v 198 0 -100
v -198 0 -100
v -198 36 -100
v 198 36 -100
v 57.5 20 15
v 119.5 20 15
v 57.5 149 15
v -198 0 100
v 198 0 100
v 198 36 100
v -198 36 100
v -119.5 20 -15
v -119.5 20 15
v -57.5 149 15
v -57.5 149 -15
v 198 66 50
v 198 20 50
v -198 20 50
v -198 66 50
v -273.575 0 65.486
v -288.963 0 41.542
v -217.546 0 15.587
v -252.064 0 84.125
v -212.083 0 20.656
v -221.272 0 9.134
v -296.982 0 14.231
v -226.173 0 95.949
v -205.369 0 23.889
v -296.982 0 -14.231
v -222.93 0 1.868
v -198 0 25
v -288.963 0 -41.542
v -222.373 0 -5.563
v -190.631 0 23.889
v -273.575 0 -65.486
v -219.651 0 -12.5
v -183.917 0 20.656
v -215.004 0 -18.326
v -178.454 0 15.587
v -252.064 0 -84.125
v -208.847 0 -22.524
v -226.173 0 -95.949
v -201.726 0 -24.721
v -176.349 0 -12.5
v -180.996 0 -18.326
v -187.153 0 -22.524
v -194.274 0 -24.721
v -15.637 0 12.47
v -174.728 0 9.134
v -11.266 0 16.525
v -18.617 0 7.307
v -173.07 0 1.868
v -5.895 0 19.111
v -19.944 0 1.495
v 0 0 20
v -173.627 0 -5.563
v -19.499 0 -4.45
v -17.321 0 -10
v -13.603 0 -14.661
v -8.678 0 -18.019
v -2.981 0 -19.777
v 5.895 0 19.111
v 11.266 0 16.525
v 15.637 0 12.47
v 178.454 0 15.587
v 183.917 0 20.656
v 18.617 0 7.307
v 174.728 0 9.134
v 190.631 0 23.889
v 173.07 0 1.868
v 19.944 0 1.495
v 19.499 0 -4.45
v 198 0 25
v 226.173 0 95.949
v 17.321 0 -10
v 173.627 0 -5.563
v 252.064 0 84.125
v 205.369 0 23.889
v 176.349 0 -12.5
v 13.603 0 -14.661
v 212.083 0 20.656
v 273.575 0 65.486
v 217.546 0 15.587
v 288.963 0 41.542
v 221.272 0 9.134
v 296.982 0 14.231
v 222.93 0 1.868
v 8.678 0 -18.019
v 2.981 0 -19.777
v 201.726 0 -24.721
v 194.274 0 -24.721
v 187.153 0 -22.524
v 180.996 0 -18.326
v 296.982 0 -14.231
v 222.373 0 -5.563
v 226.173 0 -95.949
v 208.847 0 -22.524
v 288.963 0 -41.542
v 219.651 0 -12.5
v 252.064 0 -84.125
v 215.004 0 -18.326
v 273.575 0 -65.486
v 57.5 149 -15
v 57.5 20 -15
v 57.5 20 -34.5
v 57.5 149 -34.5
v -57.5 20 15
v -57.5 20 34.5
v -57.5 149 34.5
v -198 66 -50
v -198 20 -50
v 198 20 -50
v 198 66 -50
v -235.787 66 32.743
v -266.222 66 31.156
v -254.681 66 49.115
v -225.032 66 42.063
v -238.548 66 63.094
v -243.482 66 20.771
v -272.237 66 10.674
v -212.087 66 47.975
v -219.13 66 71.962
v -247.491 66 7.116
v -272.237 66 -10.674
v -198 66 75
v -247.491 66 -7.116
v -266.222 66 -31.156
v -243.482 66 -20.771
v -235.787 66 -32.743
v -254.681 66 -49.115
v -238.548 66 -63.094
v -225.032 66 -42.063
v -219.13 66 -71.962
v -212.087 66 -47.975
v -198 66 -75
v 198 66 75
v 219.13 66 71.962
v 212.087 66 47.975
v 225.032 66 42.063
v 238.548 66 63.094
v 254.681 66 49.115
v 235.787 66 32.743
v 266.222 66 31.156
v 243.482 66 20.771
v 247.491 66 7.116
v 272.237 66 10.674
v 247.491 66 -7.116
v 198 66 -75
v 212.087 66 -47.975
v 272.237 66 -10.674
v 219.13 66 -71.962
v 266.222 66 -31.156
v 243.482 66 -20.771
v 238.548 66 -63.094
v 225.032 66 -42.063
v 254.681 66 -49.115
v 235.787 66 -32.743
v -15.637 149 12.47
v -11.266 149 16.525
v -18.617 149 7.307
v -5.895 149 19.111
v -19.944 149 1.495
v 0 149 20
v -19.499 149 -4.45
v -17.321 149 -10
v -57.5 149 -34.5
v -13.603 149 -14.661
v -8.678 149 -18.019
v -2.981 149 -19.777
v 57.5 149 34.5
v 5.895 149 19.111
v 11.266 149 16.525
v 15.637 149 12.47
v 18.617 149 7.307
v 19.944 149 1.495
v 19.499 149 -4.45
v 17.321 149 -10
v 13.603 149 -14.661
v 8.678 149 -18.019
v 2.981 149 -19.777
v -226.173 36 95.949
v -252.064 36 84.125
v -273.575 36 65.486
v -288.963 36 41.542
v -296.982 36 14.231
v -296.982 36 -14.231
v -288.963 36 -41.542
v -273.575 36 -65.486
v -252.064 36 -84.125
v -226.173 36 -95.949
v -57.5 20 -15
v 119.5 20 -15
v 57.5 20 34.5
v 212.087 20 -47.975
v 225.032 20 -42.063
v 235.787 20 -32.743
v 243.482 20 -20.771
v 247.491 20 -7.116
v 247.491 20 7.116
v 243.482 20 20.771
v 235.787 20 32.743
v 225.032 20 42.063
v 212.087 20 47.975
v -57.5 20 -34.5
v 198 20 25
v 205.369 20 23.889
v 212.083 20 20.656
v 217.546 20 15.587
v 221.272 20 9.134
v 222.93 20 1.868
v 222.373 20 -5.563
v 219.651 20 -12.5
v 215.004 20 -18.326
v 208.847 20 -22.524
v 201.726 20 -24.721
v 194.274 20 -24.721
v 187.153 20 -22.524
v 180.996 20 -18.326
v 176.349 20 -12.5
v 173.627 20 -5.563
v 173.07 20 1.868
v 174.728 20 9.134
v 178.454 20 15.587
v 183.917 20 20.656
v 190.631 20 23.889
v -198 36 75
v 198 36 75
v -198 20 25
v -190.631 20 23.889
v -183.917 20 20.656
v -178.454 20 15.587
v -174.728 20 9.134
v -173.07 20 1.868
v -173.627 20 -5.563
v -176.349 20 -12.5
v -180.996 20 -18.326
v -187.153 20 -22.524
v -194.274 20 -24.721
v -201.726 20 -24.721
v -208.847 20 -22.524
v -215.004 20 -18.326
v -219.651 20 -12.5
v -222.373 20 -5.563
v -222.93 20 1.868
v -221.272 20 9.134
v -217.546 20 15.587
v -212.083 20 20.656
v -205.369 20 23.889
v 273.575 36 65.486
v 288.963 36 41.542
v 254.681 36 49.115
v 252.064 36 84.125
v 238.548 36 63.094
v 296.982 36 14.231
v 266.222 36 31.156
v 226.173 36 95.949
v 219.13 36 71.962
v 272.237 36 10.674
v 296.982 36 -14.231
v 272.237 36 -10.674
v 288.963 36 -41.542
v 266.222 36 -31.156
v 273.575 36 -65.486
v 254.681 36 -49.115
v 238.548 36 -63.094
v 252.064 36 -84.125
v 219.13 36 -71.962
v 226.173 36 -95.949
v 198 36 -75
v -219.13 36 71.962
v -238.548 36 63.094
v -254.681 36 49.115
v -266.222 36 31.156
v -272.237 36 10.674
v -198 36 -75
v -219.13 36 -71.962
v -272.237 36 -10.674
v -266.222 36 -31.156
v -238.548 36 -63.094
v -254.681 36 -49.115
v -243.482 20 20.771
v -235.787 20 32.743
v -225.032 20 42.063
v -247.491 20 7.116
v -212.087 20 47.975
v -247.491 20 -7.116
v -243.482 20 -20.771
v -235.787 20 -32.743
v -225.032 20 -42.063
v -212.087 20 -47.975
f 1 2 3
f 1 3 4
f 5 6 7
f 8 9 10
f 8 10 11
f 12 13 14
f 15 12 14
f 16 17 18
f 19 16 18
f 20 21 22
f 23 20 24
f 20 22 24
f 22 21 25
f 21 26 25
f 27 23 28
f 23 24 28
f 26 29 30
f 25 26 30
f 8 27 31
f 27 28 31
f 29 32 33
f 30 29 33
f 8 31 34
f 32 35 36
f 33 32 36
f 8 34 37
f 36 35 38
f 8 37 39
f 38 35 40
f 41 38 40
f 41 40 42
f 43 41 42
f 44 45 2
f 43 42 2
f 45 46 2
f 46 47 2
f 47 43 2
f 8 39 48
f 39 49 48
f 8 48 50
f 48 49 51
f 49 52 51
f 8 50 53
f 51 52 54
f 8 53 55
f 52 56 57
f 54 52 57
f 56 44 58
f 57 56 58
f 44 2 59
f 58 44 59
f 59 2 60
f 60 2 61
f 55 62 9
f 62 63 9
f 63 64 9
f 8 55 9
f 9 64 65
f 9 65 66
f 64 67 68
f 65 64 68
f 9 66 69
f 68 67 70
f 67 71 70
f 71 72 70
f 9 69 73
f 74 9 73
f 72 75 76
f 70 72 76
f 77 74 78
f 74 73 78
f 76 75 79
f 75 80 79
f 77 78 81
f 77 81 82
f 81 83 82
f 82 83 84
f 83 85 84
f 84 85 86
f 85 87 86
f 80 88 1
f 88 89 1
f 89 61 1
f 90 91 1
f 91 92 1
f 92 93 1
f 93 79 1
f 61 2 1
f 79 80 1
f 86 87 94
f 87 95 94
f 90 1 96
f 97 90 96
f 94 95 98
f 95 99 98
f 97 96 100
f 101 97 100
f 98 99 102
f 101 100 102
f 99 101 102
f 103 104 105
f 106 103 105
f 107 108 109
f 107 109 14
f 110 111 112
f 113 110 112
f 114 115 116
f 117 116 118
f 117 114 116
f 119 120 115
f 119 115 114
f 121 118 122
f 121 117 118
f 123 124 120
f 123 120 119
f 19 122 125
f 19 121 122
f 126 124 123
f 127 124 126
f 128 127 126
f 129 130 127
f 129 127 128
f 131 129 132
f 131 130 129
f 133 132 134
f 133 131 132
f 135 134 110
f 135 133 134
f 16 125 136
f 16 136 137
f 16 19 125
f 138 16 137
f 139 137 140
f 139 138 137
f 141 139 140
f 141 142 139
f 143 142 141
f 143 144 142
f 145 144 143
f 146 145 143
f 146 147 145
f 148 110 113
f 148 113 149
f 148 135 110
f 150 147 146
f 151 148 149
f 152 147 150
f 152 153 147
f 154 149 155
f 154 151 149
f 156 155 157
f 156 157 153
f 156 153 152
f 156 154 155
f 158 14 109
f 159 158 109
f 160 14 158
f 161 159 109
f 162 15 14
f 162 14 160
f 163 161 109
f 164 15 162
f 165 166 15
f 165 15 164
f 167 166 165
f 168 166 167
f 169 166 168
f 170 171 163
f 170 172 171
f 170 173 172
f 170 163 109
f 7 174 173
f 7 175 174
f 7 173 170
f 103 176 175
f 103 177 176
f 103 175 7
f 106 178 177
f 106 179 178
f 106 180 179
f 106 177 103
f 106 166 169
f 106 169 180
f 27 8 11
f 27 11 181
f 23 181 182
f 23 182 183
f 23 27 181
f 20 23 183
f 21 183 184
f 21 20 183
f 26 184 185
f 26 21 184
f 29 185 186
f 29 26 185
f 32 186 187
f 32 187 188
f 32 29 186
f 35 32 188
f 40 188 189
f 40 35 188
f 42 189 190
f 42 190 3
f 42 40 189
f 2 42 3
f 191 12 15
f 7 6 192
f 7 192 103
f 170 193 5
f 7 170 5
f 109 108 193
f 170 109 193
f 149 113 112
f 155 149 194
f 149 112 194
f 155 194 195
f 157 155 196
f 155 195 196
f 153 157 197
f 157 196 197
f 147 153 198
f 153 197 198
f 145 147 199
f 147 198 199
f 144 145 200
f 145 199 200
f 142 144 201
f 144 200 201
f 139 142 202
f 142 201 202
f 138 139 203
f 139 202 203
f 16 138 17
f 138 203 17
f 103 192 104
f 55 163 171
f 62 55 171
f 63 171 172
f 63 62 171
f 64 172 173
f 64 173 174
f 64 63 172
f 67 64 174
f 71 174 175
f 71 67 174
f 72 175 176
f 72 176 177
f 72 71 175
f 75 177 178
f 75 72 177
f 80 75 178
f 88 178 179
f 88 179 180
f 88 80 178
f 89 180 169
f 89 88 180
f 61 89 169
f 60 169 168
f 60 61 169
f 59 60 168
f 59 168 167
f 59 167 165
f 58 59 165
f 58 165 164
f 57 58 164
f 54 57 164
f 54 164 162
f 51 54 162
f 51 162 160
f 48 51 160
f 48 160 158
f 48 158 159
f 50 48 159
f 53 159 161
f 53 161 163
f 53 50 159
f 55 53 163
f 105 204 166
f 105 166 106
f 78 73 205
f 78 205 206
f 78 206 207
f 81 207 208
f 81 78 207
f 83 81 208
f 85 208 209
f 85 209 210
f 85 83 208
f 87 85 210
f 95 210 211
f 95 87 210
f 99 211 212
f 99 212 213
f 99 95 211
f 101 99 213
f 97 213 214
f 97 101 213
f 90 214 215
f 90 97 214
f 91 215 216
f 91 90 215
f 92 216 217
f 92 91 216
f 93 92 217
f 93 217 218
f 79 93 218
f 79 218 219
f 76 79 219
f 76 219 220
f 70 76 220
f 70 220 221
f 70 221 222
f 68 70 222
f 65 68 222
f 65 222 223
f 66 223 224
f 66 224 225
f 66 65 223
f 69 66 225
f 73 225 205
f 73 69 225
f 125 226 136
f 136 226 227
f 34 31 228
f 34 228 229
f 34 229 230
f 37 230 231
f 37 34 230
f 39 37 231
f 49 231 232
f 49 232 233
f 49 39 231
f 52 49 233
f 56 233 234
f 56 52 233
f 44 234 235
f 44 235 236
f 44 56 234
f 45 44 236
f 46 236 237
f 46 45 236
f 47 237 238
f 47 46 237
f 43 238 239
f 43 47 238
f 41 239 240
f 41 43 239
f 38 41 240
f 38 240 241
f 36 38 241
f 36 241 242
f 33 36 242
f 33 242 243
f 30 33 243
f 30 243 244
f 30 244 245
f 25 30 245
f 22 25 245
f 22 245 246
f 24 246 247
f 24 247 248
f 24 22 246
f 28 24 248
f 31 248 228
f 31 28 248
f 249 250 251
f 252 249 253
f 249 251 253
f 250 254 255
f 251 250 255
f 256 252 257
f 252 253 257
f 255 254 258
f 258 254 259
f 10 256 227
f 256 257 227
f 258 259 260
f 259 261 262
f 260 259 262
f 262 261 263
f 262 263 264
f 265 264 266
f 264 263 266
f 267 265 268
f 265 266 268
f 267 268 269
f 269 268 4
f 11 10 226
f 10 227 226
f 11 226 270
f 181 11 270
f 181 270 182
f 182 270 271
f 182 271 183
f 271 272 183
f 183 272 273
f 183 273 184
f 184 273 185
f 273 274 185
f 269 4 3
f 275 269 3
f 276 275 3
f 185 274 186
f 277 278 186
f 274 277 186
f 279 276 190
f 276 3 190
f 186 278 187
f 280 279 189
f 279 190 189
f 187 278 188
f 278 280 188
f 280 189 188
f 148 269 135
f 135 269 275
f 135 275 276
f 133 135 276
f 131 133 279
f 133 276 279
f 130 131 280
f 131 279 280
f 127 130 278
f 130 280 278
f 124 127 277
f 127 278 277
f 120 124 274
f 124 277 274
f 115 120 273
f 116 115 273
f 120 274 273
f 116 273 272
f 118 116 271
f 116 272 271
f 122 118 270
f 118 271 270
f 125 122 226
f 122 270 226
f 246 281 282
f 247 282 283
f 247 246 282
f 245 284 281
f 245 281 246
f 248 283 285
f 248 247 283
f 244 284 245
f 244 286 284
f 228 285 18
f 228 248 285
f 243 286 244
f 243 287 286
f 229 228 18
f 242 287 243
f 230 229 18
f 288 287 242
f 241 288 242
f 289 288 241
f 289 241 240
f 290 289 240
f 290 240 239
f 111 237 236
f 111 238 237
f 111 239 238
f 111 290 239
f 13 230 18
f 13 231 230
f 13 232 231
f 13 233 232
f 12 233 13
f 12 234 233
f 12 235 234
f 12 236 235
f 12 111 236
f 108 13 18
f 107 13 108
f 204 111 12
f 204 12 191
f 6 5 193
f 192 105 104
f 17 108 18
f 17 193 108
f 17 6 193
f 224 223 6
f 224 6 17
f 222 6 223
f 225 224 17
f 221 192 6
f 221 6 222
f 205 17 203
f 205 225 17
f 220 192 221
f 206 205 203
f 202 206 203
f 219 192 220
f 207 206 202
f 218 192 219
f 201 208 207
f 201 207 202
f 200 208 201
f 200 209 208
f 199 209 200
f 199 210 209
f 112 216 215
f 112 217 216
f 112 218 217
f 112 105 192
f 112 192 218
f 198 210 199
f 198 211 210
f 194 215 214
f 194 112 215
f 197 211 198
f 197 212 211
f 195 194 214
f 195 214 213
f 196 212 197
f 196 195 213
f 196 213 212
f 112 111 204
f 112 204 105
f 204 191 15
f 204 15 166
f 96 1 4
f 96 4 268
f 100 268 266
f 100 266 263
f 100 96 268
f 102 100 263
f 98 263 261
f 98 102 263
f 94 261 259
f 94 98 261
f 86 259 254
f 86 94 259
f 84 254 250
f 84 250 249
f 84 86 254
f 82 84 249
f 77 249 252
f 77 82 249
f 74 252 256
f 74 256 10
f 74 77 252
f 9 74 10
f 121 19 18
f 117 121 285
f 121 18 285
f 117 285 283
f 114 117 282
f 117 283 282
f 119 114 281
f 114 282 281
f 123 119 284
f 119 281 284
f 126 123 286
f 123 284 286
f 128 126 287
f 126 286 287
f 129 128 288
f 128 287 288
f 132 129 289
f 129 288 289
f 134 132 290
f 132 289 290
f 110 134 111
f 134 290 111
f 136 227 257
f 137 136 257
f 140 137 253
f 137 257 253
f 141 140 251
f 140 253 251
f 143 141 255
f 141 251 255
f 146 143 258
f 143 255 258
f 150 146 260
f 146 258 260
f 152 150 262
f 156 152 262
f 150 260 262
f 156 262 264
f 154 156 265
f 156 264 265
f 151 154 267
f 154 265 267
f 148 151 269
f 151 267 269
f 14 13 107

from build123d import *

# Parameters (mm, degrees)
BOSS_EXTRUDE2_DEPTH = 36
BOSS_EXTRUDE3_DEPTH = 66
SKETCH1_7_R         = 25
BOSS_EXTRUDE4_DEPTH = 20
SKETCH1_8_W         = 115
SKETCH1_8_H         = 69
SKETCH1_8_R         = 20
BOSS_EXTRUDE5_DEPTH = 149
SKETCH1_10_W        = 62
SKETCH1_10_H        = 30
BOSS_EXTRUDE6_DEPTH = 20
RIB2_REACH          = 354.463
SKETCH5_WALL_W      = 850.051346756
SKETCH5_WALL_H      = 30


with BuildPart() as part:
    # Sketch1 → Boss-Extrude2 (new body)
    with BuildSketch(Plane(origin=(0, 0, 0), x_dir=(1, 0, 0), z_dir=(0, 1, 0))):
        with BuildLine():
            ThreePointArc((198, 100), (298, 0), (198, -100))
            Line((198, -100), (-198, -100))
            ThreePointArc((-198, -100), (-298, 0), (-198, 100))
            Line((-198, 100), (198, 100))
        make_face()
        with BuildLine():
            ThreePointArc((198, -75), (273, 0), (198, 75))
            Line((198, 75), (-198, 75))
            ThreePointArc((-198, 75), (-273, 0), (-198, -75))
            Line((-198, -75), (198, -75))
        make_face(mode=Mode.SUBTRACT)
    extrude(amount=BOSS_EXTRUDE2_DEPTH)

    # Sketch1<6> → Boss-Extrude3 (add)
    with BuildSketch(Plane(origin=(0, 0, 0), x_dir=(1, 0, 0), z_dir=(0, 1, 0))):
        with BuildLine():
            Line((-198, -75), (198, -75))
            ThreePointArc((198, -75), (273, 0), (198, 75))
            Line((198, 75), (-198, 75))
            ThreePointArc((-198, 75), (-273, 0), (-198, -75))
        make_face()
        with BuildLine():
            Line((-198, 50), (198, 50))
            ThreePointArc((198, 50), (248, 0), (198, -50))
            Line((198, -50), (-198, -50))
            ThreePointArc((-198, -50), (-248, 0), (-198, 50))
        make_face(mode=Mode.SUBTRACT)
    extrude(amount=BOSS_EXTRUDE3_DEPTH)

    # Sketch1<7> → Boss-Extrude4 (add)
    with BuildSketch(Plane(origin=(0, 0, 0), x_dir=(1, 0, 0), z_dir=(0, 1, 0))):
        with BuildLine():
            Line((198, 50), (-198, 50))
            ThreePointArc((-198, 50), (-248, 0), (-198, -50))
            Line((-198, -50), (198, -50))
            ThreePointArc((198, -50), (248, 0), (198, 50))
        make_face()
        with Locations(Location((-198, 0, 0), (0, 0, 270))):
            Circle(SKETCH1_7_R, mode=Mode.SUBTRACT)
        Polygon((57.5, -34.5), (-57.5, -34.5), (-57.5, -15), (-119.5, -15), (-119.5, 15), (-57.5, 15), (-57.5, 34.5), (57.5, 34.5), (57.5, 15), (119.5, 15), (119.5, -15), (57.5, -15), align=None, mode=Mode.SUBTRACT)
        with Locations(Location((198, 0, 0), (0, 0, 270))):
            Circle(SKETCH1_7_R, mode=Mode.SUBTRACT)
    extrude(amount=BOSS_EXTRUDE4_DEPTH)

    # Sketch1<8> → Boss-Extrude5 (add)
    with BuildSketch(Plane(origin=(0, 0, 0), x_dir=(1, 0, 0), z_dir=(0, 1, 0))):
        Rectangle(SKETCH1_8_W, SKETCH1_8_H)
        with Locations(Location((0, 0, 0), (0, 0, 270))):
            Circle(SKETCH1_8_R, mode=Mode.SUBTRACT)
    extrude(amount=BOSS_EXTRUDE5_DEPTH)

    # Sketch1<10> → Boss-Extrude6 (add)
    with BuildSketch(Plane(origin=(0, 0, 0), x_dir=(1, 0, 0), z_dir=(0, 1, 0))):
        with Locations((-88.5, 0)):
            Rectangle(SKETCH1_10_W, SKETCH1_10_H)
        with Locations((88.5, 0)):
            Rectangle(SKETCH1_10_W, SKETCH1_10_H)
    extrude(amount=BOSS_EXTRUDE6_DEPTH)

    # Sketch5 wall → Rib2 (add, up to next)
    with BuildSketch(Plane(origin=(-88.5, 84.5, 15), x_dir=(0.433185294803, 0.901304887575, 0), z_dir=(0.901304887575, -0.433185294803, 0)), mode=Mode.PRIVATE) as rib2_sk1:
        with Locations((0, -15)):
            Rectangle(SKETCH5_WALL_W, SKETCH5_WALL_H)
    rib2_tool1 = extrude(rib2_sk1.sketch, amount=RIB2_REACH, mode=Mode.PRIVATE) - part.part
    rib2 = rib2_tool1.solids().sort_by_distance((-88.5, 84.5, 15))[0]
    add(rib2)

    # Mirror1: Rib2 across plane
    add(rib2.mirror(Plane(origin=(0, 0, 0), x_dir=(0, 0, 1), z_dir=(1, 0, 0))))


solid = part.part
